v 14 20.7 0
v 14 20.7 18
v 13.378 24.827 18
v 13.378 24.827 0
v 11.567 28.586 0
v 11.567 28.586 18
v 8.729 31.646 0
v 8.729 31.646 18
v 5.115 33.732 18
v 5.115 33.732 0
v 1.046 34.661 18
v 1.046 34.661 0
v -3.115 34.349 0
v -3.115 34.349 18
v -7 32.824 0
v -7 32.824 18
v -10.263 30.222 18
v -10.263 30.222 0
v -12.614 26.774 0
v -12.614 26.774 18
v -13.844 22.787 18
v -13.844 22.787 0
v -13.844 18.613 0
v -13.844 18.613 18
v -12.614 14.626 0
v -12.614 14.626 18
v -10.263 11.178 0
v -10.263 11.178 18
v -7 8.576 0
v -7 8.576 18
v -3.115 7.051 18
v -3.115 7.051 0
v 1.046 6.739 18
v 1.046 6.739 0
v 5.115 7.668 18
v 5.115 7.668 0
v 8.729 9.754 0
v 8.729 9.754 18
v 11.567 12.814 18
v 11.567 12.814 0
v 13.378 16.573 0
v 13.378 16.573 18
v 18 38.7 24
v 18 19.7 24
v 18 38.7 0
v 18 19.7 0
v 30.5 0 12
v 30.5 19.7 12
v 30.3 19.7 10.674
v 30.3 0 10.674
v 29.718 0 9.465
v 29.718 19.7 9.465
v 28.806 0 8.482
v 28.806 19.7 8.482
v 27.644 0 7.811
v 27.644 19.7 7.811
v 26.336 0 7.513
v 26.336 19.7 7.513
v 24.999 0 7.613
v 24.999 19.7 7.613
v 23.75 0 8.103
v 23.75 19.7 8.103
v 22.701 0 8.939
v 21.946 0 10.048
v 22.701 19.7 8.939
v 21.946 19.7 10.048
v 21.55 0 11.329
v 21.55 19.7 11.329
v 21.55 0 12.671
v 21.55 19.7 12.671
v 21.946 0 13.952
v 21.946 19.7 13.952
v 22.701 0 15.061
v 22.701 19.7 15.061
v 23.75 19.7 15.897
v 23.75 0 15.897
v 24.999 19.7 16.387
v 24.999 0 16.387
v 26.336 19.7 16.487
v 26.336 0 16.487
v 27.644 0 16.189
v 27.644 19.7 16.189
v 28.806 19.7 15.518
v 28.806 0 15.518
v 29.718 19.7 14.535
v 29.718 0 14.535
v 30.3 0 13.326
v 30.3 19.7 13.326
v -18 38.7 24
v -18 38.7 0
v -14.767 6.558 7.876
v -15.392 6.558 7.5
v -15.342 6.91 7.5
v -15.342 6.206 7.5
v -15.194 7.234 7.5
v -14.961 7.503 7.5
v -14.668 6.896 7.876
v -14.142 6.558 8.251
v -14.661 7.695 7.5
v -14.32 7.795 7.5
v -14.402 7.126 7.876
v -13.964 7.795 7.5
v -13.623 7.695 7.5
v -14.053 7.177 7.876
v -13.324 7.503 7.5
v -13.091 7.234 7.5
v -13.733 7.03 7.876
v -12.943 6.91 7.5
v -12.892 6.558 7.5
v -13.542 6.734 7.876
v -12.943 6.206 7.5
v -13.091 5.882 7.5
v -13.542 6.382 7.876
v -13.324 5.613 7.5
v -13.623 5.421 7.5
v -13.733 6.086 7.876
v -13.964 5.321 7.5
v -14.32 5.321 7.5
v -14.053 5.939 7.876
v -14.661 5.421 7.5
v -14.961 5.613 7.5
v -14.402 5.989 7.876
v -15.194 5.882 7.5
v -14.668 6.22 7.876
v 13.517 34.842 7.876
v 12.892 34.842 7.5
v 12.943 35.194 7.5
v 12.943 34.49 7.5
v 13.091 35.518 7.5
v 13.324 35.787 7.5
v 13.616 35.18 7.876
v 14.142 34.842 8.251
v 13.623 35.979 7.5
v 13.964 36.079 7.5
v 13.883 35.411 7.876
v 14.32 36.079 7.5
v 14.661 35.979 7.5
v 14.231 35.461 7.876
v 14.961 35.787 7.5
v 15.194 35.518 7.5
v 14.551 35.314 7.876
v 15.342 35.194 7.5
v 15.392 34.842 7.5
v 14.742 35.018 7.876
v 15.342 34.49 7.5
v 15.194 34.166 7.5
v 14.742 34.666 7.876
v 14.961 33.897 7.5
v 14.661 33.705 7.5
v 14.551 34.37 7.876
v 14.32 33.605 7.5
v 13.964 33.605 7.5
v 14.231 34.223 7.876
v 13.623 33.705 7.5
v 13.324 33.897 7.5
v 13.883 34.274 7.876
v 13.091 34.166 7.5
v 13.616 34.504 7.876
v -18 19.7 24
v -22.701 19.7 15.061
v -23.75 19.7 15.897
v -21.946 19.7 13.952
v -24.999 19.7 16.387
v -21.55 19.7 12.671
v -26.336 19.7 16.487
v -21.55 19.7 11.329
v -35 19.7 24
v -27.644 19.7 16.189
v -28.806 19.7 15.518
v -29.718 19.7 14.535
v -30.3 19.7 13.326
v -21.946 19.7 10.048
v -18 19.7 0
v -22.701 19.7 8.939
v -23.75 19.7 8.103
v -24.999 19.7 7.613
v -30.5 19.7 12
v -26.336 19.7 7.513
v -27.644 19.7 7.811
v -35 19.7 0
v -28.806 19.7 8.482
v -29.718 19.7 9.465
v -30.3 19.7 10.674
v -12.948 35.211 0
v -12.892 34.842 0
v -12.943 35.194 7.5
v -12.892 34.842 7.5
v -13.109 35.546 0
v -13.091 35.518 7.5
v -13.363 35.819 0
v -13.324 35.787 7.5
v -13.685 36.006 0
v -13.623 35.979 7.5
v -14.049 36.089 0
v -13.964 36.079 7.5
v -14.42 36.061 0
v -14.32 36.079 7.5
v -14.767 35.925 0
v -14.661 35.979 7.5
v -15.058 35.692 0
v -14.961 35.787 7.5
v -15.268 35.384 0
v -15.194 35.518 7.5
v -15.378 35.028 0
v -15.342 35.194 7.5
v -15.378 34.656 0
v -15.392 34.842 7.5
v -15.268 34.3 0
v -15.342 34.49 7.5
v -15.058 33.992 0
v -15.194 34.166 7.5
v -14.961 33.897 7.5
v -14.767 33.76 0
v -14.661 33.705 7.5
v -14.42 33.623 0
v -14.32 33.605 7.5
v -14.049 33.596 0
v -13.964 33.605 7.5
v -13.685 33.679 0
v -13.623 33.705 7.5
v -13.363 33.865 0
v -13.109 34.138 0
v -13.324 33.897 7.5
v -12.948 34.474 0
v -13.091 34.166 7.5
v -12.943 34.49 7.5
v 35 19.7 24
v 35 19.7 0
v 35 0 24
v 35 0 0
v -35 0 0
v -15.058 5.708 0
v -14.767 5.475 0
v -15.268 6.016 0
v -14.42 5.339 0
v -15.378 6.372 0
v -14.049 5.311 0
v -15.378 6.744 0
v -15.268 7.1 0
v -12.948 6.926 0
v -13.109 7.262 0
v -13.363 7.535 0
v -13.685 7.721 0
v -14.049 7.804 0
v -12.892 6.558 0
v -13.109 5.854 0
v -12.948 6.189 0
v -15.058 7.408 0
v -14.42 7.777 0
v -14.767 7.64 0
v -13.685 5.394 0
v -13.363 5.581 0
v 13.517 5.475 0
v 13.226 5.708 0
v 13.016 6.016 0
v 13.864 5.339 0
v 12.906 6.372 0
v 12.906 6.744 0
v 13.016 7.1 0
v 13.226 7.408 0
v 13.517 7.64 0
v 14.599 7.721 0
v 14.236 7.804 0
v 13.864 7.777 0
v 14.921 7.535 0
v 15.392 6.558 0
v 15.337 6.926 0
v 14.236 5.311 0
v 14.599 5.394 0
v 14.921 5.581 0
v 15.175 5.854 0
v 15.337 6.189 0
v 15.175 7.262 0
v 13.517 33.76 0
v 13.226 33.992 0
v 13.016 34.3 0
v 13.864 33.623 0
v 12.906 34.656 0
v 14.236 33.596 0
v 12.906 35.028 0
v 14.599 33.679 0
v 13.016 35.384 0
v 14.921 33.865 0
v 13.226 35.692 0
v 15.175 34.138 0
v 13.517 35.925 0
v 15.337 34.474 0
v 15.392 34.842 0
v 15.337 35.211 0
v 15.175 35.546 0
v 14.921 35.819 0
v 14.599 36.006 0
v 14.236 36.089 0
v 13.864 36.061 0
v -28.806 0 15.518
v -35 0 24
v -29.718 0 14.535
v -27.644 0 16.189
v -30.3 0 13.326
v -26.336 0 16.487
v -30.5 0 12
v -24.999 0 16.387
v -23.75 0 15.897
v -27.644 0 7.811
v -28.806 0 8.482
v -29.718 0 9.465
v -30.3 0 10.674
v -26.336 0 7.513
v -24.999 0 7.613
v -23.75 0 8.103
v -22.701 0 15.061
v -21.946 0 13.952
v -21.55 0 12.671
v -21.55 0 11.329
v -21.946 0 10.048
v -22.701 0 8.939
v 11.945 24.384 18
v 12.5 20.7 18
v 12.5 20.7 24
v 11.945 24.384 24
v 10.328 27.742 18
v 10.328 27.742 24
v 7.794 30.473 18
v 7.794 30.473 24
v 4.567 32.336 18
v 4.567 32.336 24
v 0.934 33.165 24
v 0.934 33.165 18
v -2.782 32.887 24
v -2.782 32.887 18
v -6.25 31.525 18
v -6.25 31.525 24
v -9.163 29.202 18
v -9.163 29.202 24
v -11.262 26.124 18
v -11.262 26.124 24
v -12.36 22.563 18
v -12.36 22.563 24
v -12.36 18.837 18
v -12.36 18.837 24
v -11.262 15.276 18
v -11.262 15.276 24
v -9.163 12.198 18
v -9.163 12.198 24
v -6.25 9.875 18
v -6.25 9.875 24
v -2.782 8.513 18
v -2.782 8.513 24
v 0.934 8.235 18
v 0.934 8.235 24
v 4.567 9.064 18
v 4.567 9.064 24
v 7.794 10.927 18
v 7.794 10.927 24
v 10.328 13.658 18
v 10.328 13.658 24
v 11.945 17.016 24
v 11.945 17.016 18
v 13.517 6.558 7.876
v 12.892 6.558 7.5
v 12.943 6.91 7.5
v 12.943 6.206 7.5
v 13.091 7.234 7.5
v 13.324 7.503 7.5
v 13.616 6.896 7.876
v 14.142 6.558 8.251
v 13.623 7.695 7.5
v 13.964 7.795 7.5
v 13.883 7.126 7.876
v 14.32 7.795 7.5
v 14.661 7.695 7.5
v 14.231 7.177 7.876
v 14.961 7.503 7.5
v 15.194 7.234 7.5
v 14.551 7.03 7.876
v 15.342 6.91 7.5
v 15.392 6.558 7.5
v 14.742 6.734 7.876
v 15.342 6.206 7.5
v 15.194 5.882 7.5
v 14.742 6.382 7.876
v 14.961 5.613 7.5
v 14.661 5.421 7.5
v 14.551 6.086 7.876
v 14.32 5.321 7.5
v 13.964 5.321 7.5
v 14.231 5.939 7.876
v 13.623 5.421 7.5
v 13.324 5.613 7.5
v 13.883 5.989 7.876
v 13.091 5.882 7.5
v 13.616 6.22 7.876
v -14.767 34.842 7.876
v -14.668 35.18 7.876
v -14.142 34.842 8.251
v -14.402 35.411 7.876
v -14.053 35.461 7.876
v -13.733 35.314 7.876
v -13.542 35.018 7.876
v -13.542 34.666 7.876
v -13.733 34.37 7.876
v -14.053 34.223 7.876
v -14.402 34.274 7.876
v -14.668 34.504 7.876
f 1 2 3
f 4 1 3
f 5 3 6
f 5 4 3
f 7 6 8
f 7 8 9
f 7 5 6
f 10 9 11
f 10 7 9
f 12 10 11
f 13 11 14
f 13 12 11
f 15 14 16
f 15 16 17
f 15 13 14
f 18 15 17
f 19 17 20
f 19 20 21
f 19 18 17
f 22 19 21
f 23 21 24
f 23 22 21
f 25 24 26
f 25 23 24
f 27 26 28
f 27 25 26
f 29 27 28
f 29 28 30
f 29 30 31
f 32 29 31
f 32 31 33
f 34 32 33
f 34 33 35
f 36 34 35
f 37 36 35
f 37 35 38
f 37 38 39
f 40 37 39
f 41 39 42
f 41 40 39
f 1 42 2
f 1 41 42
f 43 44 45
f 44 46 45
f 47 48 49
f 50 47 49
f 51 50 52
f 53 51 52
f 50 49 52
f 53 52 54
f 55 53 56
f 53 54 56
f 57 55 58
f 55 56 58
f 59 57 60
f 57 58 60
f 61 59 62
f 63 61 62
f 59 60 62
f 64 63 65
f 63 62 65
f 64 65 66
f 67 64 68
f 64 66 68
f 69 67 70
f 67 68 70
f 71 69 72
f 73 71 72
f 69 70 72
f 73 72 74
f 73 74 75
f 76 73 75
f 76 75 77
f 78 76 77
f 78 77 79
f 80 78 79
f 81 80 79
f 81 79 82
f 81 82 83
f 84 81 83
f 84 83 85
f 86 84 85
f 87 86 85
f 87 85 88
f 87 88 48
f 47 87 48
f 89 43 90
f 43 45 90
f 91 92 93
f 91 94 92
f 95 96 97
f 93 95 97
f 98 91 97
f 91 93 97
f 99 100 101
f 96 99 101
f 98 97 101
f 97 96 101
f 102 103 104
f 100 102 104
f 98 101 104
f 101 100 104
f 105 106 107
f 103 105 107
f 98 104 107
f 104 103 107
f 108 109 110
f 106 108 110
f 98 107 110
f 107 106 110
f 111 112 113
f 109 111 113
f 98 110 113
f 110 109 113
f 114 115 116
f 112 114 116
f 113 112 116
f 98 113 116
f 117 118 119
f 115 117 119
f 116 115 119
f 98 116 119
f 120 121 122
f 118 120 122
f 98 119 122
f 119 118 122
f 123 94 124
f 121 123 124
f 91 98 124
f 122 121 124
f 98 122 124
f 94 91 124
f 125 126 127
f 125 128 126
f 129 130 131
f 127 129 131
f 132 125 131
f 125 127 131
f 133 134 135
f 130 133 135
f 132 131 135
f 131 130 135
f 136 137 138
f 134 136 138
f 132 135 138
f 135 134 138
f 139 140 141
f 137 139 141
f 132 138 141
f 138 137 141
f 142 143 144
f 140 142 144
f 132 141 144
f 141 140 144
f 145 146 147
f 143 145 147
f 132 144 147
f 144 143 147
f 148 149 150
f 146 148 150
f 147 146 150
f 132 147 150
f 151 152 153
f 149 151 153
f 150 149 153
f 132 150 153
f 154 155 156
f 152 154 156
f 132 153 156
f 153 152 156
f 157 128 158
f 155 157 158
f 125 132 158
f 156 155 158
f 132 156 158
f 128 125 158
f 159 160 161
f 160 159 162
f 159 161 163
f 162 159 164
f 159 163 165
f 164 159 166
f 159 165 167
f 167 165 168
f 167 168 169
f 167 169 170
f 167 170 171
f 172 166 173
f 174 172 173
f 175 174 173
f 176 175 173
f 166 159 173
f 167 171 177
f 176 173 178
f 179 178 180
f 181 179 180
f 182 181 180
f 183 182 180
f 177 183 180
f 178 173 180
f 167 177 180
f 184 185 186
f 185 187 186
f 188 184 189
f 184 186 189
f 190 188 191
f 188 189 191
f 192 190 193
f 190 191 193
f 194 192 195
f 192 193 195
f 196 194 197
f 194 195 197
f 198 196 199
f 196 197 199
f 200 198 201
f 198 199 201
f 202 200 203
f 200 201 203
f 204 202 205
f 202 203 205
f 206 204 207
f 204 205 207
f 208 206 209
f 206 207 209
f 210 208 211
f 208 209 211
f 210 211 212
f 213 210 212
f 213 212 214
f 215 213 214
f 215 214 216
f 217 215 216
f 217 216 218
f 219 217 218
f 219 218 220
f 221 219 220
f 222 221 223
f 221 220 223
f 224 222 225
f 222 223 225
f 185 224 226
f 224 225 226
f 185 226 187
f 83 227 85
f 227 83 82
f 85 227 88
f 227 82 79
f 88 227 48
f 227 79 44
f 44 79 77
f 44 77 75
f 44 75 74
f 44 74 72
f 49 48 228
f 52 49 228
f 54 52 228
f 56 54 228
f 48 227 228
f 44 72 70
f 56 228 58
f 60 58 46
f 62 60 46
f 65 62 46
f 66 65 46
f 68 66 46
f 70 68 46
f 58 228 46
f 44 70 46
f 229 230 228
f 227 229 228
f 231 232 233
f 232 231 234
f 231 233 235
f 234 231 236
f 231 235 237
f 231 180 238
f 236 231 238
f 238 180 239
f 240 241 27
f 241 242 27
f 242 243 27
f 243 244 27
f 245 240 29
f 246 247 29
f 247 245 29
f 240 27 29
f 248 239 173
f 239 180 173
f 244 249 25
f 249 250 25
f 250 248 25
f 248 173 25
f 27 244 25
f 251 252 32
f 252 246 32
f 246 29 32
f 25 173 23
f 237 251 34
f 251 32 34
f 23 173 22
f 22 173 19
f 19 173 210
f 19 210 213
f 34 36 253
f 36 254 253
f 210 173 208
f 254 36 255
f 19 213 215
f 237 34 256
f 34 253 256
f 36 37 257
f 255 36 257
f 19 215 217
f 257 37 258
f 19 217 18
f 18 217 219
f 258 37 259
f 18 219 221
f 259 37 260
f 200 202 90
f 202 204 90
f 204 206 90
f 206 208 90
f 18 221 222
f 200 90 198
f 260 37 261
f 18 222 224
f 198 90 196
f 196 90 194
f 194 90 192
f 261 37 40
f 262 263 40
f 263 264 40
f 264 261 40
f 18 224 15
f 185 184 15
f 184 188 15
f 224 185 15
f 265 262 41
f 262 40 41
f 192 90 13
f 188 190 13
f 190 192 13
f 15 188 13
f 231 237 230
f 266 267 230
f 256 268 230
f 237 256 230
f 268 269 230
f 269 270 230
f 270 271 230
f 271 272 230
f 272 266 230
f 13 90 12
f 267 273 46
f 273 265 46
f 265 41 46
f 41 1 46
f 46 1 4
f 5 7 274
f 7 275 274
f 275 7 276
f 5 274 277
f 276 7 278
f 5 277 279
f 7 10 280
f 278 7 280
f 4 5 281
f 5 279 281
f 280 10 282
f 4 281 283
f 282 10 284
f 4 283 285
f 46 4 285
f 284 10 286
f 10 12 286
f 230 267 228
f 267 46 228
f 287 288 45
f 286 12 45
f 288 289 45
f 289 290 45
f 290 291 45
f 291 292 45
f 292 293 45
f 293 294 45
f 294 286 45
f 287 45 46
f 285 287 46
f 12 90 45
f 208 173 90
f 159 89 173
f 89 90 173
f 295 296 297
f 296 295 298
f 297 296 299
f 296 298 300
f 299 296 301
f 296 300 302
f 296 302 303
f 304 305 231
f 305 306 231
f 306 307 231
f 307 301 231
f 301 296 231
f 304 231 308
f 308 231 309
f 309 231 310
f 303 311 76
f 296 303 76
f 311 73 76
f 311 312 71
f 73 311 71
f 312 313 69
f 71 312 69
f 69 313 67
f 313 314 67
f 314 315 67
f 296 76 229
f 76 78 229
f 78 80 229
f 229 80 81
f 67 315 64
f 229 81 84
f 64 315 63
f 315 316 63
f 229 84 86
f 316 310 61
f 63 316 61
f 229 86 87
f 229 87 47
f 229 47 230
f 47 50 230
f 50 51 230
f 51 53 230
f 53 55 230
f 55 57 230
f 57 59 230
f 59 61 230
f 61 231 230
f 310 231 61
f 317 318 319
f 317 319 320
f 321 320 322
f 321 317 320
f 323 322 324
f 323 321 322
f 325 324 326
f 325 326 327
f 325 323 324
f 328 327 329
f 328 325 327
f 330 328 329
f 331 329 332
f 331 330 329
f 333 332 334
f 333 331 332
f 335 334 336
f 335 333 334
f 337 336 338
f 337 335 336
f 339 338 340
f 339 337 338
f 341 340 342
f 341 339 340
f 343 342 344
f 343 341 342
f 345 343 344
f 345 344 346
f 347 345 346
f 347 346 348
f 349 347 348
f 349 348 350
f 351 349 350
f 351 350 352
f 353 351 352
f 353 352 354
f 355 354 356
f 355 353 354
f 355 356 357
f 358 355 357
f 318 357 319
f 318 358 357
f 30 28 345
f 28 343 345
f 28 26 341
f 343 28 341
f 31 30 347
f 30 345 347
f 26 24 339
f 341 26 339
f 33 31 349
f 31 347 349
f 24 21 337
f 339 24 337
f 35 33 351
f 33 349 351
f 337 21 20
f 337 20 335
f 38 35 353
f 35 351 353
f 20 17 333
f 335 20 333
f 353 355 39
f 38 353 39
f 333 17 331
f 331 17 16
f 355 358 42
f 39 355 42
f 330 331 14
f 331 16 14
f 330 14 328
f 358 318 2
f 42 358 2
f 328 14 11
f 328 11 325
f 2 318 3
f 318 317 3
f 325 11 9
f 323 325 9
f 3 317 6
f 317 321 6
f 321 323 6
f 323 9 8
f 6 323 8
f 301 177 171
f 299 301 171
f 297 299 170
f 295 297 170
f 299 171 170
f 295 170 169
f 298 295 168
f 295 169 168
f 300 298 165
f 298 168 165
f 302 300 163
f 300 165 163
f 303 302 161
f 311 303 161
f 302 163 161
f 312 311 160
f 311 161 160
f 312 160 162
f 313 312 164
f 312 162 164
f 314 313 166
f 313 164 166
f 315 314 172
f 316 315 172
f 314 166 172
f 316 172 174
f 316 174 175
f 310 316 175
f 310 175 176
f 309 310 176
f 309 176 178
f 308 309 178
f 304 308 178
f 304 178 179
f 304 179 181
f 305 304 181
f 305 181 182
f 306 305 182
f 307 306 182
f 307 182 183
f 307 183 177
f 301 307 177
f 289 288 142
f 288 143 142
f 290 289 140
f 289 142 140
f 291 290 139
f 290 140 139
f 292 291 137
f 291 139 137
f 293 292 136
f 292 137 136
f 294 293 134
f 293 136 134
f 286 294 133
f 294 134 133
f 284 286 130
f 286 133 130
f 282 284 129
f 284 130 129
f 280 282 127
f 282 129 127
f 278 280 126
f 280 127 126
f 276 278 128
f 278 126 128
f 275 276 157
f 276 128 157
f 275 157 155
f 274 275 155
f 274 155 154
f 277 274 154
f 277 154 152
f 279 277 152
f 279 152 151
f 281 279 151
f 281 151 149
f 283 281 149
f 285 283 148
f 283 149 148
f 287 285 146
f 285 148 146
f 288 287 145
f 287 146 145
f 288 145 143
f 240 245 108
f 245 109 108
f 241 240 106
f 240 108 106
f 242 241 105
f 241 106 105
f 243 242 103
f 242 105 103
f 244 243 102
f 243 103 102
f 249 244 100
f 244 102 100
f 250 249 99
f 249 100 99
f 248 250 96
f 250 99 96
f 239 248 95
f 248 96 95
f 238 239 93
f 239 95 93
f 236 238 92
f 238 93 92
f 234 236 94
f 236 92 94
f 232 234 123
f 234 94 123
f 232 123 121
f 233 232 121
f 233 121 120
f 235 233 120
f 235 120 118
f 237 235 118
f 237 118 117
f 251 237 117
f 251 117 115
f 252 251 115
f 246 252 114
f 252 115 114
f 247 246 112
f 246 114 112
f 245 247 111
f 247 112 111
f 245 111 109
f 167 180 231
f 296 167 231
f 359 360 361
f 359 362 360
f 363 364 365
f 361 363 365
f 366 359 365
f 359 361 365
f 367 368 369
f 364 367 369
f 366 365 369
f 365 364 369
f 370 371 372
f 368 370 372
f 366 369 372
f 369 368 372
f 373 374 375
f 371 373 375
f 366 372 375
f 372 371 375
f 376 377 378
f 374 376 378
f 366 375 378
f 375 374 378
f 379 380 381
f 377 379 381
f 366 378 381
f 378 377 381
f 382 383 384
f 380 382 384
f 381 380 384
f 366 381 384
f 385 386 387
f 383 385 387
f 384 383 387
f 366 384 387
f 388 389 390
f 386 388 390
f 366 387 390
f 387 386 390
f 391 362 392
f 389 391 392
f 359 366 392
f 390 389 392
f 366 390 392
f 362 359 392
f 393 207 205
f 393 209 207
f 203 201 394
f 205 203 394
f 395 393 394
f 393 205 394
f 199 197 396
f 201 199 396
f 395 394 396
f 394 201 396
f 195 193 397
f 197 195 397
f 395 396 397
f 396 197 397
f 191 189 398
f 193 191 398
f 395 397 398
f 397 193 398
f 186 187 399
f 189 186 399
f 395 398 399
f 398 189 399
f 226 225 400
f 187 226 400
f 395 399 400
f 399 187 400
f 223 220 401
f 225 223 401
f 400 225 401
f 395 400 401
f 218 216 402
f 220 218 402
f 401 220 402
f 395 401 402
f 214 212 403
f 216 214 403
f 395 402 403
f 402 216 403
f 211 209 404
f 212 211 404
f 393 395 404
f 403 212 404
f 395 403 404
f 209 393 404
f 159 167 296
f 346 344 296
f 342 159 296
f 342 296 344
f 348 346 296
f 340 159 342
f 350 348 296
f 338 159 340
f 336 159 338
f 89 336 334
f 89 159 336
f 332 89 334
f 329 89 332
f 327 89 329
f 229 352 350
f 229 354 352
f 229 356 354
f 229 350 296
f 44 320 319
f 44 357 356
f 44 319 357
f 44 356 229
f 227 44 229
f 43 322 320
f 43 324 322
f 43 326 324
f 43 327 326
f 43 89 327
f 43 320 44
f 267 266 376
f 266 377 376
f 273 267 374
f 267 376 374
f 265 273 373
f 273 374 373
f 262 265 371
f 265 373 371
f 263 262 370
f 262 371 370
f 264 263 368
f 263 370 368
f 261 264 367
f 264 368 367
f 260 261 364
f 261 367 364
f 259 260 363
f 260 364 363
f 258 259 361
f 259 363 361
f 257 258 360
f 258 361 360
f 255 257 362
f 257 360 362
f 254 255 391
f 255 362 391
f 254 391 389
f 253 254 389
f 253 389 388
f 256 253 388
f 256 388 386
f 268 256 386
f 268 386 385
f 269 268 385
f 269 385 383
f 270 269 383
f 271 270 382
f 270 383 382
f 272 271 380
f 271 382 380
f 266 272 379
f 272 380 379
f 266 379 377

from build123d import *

# Parameters (mm, degrees)
ESBO_O1_R                     = 14
RESSALTO_EXTRUS_O3_DEPTH      = 18
ESBO_O3_R                     = 14
ESBO_O3_R_2                   = 12.5
RESSALTO_EXTRUS_O4_DEPTH      = 6
ESBO_O4_R                     = 4.5
CORTE_EXTRUS_O1_DEPTH         = 47.787712062
FURO_ROSCADO_DE_M3X0_51_D     = 2.5
FURO_ROSCADO_DE_M3X0_51_DEPTH = 7.5
FURO_ROSCADO_DE_M3X0_51_TIP   = 0.751075774


with BuildPart() as part:
    # Esboço1 → Ressalto-extrusão3 (new body)
    with BuildSketch(Plane.XY):
        Polygon((-35, 0), (35, 0), (35, 19.7), (18, 19.7), (18, 38.7), (-18, 38.7), (-18, 19.7), (-35, 19.7), align=None)
        with Locations((0, 20.7)):
            Circle(ESBO_O1_R, mode=Mode.SUBTRACT)
    extrude(amount=RESSALTO_EXTRUS_O3_DEPTH)

    # Esboço3 → Ressalto-extrusão4 (add)
    # profile 1 of 2: a face of its own
    with BuildSketch(Plane.XY.offset(18)):
        Polygon((35, 0), (35, 19.7), (18, 19.7), (18, 38.7), (-18, 38.7), (-18, 19.7), (-35, 19.7), (-35, 0), align=None)
        with Locations((0, 20.7)):
            Circle(ESBO_O3_R, mode=Mode.SUBTRACT)
    # profile 2 of 2: a face of its own
    with BuildSketch(Plane.XY.offset(18)):
        with Locations((0, 20.7)):
            Circle(ESBO_O3_R)
        with Locations((0, 20.7)):
            Circle(ESBO_O3_R_2, mode=Mode.SUBTRACT)
    extrude(amount=RESSALTO_EXTRUS_O4_DEPTH)

    # Esboço4 → Corte-extrusão1 (cut, through all)
    with BuildSketch(Plane(origin=(0, 19.7, 0), x_dir=(1, 0, 0), z_dir=(0, 1, 0))):
        with Locations(Location((-26, -12, 0), (0, 0, 180))):
            Circle(ESBO_O4_R)
        with Locations((26, -12)):
            Circle(ESBO_O4_R)
    extrude(amount=-CORTE_EXTRUS_O1_DEPTH, mode=Mode.SUBTRACT)

    # Furo roscado de M3x0.51
    with Locations(Plane(origin=(0, 0, 0), x_dir=(-1, 0, 0), z_dir=(0, 0, -1))):
        with Locations((14.142135624, 34.842135624), (14.142135624, 6.557864376), (-14.142135624, 6.557864376), (-14.142135624, 34.842135624)):
            Hole(FURO_ROSCADO_DE_M3X0_51_D / 2, depth=FURO_ROSCADO_DE_M3X0_51_DEPTH)
            with Locations((0, 0, -(FURO_ROSCADO_DE_M3X0_51_DEPTH + FURO_ROSCADO_DE_M3X0_51_TIP / 2))):  # 118° drill point
                Cone(0, FURO_ROSCADO_DE_M3X0_51_D / 2, FURO_ROSCADO_DE_M3X0_51_TIP, mode=Mode.SUBTRACT)


solid = part.part
